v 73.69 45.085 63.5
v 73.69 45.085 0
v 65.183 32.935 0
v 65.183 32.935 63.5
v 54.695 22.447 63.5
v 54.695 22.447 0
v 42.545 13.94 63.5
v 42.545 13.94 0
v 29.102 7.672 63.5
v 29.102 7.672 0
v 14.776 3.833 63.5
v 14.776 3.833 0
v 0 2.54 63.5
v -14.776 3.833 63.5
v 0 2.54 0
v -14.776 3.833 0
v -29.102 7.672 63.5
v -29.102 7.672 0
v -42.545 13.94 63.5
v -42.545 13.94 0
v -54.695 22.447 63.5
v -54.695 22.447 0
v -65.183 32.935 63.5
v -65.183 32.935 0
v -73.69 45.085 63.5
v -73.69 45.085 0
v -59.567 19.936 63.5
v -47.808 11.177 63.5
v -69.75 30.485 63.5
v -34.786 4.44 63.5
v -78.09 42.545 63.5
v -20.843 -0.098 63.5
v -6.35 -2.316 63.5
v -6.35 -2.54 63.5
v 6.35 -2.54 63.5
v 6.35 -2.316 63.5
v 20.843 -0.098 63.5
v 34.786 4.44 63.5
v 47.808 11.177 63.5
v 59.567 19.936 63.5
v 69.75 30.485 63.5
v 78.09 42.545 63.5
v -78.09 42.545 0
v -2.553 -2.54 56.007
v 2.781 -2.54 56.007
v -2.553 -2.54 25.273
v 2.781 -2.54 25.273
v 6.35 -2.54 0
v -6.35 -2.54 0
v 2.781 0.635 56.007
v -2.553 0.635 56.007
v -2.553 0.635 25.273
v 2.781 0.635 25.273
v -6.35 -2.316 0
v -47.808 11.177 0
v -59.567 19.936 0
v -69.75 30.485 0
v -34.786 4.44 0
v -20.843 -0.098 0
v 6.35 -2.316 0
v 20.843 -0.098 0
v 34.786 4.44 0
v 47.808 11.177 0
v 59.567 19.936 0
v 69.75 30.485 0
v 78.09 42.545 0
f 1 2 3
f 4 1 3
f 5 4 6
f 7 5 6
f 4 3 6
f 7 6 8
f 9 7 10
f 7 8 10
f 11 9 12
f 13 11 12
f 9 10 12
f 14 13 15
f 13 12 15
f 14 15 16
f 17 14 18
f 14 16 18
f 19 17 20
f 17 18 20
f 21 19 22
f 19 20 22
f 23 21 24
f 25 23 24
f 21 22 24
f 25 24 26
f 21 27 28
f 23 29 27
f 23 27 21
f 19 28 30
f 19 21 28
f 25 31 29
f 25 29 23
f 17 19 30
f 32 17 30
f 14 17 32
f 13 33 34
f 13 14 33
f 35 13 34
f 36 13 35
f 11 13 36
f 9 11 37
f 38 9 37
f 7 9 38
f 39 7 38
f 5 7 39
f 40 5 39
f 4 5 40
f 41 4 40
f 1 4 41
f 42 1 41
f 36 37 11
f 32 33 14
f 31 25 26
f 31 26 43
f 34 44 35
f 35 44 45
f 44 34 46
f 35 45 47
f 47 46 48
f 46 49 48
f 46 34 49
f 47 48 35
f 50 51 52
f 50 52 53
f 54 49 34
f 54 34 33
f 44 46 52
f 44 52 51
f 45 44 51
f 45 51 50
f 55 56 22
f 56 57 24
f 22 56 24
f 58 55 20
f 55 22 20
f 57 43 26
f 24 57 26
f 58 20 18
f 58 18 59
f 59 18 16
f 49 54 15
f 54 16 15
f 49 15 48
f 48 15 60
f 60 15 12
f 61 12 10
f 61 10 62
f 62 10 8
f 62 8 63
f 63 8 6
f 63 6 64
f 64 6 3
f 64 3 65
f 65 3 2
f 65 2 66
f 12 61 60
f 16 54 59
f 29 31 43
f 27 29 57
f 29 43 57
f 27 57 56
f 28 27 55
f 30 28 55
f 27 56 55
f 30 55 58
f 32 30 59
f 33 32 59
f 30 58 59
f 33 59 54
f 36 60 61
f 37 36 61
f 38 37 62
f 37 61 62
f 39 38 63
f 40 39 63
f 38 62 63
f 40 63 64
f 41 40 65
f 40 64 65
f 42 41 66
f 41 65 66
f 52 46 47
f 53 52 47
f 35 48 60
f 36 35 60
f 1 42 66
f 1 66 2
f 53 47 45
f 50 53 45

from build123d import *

# Parameters (mm, degrees)
SKETCH1_W           = 12.7
SKETCH1_H           = 5.08
BOSS_EXTRUDE1_DEPTH = 63.5
SKETCH2_W           = 5.334
SKETCH2_H           = 30.734
CUT_EXTRUDE1_DEPTH  = 3.175


with BuildPart() as part:
    # Sketch1 → Boss-Extrude1 (new body)
    with BuildSketch(Plane.XY):
        Rectangle(SKETCH1_W, SKETCH1_H)
        with BuildLine():
            Line((-73.690101608, 45.085), (-78.089510659, 42.545))
            ThreePointArc((-78.089510659, 42.545), (0, -2.54), (78.089510659, 42.545))
            Line((78.089510659, 42.545), (73.690101608, 45.085))
            ThreePointArc((73.690101608, 45.085), (0, 2.54), (-73.690101608, 45.085))
        make_face()
    extrude(amount=BOSS_EXTRUDE1_DEPTH)

    # Sketch2 → Cut-Extrude1 (cut)
    with BuildSketch(Plane.XZ.offset(2.54)):
        with Locations((0.1143, 40.64)):
            Rectangle(SKETCH2_W, SKETCH2_H)
    extrude(amount=-CUT_EXTRUDE1_DEPTH, mode=Mode.SUBTRACT)


solid = part.part
